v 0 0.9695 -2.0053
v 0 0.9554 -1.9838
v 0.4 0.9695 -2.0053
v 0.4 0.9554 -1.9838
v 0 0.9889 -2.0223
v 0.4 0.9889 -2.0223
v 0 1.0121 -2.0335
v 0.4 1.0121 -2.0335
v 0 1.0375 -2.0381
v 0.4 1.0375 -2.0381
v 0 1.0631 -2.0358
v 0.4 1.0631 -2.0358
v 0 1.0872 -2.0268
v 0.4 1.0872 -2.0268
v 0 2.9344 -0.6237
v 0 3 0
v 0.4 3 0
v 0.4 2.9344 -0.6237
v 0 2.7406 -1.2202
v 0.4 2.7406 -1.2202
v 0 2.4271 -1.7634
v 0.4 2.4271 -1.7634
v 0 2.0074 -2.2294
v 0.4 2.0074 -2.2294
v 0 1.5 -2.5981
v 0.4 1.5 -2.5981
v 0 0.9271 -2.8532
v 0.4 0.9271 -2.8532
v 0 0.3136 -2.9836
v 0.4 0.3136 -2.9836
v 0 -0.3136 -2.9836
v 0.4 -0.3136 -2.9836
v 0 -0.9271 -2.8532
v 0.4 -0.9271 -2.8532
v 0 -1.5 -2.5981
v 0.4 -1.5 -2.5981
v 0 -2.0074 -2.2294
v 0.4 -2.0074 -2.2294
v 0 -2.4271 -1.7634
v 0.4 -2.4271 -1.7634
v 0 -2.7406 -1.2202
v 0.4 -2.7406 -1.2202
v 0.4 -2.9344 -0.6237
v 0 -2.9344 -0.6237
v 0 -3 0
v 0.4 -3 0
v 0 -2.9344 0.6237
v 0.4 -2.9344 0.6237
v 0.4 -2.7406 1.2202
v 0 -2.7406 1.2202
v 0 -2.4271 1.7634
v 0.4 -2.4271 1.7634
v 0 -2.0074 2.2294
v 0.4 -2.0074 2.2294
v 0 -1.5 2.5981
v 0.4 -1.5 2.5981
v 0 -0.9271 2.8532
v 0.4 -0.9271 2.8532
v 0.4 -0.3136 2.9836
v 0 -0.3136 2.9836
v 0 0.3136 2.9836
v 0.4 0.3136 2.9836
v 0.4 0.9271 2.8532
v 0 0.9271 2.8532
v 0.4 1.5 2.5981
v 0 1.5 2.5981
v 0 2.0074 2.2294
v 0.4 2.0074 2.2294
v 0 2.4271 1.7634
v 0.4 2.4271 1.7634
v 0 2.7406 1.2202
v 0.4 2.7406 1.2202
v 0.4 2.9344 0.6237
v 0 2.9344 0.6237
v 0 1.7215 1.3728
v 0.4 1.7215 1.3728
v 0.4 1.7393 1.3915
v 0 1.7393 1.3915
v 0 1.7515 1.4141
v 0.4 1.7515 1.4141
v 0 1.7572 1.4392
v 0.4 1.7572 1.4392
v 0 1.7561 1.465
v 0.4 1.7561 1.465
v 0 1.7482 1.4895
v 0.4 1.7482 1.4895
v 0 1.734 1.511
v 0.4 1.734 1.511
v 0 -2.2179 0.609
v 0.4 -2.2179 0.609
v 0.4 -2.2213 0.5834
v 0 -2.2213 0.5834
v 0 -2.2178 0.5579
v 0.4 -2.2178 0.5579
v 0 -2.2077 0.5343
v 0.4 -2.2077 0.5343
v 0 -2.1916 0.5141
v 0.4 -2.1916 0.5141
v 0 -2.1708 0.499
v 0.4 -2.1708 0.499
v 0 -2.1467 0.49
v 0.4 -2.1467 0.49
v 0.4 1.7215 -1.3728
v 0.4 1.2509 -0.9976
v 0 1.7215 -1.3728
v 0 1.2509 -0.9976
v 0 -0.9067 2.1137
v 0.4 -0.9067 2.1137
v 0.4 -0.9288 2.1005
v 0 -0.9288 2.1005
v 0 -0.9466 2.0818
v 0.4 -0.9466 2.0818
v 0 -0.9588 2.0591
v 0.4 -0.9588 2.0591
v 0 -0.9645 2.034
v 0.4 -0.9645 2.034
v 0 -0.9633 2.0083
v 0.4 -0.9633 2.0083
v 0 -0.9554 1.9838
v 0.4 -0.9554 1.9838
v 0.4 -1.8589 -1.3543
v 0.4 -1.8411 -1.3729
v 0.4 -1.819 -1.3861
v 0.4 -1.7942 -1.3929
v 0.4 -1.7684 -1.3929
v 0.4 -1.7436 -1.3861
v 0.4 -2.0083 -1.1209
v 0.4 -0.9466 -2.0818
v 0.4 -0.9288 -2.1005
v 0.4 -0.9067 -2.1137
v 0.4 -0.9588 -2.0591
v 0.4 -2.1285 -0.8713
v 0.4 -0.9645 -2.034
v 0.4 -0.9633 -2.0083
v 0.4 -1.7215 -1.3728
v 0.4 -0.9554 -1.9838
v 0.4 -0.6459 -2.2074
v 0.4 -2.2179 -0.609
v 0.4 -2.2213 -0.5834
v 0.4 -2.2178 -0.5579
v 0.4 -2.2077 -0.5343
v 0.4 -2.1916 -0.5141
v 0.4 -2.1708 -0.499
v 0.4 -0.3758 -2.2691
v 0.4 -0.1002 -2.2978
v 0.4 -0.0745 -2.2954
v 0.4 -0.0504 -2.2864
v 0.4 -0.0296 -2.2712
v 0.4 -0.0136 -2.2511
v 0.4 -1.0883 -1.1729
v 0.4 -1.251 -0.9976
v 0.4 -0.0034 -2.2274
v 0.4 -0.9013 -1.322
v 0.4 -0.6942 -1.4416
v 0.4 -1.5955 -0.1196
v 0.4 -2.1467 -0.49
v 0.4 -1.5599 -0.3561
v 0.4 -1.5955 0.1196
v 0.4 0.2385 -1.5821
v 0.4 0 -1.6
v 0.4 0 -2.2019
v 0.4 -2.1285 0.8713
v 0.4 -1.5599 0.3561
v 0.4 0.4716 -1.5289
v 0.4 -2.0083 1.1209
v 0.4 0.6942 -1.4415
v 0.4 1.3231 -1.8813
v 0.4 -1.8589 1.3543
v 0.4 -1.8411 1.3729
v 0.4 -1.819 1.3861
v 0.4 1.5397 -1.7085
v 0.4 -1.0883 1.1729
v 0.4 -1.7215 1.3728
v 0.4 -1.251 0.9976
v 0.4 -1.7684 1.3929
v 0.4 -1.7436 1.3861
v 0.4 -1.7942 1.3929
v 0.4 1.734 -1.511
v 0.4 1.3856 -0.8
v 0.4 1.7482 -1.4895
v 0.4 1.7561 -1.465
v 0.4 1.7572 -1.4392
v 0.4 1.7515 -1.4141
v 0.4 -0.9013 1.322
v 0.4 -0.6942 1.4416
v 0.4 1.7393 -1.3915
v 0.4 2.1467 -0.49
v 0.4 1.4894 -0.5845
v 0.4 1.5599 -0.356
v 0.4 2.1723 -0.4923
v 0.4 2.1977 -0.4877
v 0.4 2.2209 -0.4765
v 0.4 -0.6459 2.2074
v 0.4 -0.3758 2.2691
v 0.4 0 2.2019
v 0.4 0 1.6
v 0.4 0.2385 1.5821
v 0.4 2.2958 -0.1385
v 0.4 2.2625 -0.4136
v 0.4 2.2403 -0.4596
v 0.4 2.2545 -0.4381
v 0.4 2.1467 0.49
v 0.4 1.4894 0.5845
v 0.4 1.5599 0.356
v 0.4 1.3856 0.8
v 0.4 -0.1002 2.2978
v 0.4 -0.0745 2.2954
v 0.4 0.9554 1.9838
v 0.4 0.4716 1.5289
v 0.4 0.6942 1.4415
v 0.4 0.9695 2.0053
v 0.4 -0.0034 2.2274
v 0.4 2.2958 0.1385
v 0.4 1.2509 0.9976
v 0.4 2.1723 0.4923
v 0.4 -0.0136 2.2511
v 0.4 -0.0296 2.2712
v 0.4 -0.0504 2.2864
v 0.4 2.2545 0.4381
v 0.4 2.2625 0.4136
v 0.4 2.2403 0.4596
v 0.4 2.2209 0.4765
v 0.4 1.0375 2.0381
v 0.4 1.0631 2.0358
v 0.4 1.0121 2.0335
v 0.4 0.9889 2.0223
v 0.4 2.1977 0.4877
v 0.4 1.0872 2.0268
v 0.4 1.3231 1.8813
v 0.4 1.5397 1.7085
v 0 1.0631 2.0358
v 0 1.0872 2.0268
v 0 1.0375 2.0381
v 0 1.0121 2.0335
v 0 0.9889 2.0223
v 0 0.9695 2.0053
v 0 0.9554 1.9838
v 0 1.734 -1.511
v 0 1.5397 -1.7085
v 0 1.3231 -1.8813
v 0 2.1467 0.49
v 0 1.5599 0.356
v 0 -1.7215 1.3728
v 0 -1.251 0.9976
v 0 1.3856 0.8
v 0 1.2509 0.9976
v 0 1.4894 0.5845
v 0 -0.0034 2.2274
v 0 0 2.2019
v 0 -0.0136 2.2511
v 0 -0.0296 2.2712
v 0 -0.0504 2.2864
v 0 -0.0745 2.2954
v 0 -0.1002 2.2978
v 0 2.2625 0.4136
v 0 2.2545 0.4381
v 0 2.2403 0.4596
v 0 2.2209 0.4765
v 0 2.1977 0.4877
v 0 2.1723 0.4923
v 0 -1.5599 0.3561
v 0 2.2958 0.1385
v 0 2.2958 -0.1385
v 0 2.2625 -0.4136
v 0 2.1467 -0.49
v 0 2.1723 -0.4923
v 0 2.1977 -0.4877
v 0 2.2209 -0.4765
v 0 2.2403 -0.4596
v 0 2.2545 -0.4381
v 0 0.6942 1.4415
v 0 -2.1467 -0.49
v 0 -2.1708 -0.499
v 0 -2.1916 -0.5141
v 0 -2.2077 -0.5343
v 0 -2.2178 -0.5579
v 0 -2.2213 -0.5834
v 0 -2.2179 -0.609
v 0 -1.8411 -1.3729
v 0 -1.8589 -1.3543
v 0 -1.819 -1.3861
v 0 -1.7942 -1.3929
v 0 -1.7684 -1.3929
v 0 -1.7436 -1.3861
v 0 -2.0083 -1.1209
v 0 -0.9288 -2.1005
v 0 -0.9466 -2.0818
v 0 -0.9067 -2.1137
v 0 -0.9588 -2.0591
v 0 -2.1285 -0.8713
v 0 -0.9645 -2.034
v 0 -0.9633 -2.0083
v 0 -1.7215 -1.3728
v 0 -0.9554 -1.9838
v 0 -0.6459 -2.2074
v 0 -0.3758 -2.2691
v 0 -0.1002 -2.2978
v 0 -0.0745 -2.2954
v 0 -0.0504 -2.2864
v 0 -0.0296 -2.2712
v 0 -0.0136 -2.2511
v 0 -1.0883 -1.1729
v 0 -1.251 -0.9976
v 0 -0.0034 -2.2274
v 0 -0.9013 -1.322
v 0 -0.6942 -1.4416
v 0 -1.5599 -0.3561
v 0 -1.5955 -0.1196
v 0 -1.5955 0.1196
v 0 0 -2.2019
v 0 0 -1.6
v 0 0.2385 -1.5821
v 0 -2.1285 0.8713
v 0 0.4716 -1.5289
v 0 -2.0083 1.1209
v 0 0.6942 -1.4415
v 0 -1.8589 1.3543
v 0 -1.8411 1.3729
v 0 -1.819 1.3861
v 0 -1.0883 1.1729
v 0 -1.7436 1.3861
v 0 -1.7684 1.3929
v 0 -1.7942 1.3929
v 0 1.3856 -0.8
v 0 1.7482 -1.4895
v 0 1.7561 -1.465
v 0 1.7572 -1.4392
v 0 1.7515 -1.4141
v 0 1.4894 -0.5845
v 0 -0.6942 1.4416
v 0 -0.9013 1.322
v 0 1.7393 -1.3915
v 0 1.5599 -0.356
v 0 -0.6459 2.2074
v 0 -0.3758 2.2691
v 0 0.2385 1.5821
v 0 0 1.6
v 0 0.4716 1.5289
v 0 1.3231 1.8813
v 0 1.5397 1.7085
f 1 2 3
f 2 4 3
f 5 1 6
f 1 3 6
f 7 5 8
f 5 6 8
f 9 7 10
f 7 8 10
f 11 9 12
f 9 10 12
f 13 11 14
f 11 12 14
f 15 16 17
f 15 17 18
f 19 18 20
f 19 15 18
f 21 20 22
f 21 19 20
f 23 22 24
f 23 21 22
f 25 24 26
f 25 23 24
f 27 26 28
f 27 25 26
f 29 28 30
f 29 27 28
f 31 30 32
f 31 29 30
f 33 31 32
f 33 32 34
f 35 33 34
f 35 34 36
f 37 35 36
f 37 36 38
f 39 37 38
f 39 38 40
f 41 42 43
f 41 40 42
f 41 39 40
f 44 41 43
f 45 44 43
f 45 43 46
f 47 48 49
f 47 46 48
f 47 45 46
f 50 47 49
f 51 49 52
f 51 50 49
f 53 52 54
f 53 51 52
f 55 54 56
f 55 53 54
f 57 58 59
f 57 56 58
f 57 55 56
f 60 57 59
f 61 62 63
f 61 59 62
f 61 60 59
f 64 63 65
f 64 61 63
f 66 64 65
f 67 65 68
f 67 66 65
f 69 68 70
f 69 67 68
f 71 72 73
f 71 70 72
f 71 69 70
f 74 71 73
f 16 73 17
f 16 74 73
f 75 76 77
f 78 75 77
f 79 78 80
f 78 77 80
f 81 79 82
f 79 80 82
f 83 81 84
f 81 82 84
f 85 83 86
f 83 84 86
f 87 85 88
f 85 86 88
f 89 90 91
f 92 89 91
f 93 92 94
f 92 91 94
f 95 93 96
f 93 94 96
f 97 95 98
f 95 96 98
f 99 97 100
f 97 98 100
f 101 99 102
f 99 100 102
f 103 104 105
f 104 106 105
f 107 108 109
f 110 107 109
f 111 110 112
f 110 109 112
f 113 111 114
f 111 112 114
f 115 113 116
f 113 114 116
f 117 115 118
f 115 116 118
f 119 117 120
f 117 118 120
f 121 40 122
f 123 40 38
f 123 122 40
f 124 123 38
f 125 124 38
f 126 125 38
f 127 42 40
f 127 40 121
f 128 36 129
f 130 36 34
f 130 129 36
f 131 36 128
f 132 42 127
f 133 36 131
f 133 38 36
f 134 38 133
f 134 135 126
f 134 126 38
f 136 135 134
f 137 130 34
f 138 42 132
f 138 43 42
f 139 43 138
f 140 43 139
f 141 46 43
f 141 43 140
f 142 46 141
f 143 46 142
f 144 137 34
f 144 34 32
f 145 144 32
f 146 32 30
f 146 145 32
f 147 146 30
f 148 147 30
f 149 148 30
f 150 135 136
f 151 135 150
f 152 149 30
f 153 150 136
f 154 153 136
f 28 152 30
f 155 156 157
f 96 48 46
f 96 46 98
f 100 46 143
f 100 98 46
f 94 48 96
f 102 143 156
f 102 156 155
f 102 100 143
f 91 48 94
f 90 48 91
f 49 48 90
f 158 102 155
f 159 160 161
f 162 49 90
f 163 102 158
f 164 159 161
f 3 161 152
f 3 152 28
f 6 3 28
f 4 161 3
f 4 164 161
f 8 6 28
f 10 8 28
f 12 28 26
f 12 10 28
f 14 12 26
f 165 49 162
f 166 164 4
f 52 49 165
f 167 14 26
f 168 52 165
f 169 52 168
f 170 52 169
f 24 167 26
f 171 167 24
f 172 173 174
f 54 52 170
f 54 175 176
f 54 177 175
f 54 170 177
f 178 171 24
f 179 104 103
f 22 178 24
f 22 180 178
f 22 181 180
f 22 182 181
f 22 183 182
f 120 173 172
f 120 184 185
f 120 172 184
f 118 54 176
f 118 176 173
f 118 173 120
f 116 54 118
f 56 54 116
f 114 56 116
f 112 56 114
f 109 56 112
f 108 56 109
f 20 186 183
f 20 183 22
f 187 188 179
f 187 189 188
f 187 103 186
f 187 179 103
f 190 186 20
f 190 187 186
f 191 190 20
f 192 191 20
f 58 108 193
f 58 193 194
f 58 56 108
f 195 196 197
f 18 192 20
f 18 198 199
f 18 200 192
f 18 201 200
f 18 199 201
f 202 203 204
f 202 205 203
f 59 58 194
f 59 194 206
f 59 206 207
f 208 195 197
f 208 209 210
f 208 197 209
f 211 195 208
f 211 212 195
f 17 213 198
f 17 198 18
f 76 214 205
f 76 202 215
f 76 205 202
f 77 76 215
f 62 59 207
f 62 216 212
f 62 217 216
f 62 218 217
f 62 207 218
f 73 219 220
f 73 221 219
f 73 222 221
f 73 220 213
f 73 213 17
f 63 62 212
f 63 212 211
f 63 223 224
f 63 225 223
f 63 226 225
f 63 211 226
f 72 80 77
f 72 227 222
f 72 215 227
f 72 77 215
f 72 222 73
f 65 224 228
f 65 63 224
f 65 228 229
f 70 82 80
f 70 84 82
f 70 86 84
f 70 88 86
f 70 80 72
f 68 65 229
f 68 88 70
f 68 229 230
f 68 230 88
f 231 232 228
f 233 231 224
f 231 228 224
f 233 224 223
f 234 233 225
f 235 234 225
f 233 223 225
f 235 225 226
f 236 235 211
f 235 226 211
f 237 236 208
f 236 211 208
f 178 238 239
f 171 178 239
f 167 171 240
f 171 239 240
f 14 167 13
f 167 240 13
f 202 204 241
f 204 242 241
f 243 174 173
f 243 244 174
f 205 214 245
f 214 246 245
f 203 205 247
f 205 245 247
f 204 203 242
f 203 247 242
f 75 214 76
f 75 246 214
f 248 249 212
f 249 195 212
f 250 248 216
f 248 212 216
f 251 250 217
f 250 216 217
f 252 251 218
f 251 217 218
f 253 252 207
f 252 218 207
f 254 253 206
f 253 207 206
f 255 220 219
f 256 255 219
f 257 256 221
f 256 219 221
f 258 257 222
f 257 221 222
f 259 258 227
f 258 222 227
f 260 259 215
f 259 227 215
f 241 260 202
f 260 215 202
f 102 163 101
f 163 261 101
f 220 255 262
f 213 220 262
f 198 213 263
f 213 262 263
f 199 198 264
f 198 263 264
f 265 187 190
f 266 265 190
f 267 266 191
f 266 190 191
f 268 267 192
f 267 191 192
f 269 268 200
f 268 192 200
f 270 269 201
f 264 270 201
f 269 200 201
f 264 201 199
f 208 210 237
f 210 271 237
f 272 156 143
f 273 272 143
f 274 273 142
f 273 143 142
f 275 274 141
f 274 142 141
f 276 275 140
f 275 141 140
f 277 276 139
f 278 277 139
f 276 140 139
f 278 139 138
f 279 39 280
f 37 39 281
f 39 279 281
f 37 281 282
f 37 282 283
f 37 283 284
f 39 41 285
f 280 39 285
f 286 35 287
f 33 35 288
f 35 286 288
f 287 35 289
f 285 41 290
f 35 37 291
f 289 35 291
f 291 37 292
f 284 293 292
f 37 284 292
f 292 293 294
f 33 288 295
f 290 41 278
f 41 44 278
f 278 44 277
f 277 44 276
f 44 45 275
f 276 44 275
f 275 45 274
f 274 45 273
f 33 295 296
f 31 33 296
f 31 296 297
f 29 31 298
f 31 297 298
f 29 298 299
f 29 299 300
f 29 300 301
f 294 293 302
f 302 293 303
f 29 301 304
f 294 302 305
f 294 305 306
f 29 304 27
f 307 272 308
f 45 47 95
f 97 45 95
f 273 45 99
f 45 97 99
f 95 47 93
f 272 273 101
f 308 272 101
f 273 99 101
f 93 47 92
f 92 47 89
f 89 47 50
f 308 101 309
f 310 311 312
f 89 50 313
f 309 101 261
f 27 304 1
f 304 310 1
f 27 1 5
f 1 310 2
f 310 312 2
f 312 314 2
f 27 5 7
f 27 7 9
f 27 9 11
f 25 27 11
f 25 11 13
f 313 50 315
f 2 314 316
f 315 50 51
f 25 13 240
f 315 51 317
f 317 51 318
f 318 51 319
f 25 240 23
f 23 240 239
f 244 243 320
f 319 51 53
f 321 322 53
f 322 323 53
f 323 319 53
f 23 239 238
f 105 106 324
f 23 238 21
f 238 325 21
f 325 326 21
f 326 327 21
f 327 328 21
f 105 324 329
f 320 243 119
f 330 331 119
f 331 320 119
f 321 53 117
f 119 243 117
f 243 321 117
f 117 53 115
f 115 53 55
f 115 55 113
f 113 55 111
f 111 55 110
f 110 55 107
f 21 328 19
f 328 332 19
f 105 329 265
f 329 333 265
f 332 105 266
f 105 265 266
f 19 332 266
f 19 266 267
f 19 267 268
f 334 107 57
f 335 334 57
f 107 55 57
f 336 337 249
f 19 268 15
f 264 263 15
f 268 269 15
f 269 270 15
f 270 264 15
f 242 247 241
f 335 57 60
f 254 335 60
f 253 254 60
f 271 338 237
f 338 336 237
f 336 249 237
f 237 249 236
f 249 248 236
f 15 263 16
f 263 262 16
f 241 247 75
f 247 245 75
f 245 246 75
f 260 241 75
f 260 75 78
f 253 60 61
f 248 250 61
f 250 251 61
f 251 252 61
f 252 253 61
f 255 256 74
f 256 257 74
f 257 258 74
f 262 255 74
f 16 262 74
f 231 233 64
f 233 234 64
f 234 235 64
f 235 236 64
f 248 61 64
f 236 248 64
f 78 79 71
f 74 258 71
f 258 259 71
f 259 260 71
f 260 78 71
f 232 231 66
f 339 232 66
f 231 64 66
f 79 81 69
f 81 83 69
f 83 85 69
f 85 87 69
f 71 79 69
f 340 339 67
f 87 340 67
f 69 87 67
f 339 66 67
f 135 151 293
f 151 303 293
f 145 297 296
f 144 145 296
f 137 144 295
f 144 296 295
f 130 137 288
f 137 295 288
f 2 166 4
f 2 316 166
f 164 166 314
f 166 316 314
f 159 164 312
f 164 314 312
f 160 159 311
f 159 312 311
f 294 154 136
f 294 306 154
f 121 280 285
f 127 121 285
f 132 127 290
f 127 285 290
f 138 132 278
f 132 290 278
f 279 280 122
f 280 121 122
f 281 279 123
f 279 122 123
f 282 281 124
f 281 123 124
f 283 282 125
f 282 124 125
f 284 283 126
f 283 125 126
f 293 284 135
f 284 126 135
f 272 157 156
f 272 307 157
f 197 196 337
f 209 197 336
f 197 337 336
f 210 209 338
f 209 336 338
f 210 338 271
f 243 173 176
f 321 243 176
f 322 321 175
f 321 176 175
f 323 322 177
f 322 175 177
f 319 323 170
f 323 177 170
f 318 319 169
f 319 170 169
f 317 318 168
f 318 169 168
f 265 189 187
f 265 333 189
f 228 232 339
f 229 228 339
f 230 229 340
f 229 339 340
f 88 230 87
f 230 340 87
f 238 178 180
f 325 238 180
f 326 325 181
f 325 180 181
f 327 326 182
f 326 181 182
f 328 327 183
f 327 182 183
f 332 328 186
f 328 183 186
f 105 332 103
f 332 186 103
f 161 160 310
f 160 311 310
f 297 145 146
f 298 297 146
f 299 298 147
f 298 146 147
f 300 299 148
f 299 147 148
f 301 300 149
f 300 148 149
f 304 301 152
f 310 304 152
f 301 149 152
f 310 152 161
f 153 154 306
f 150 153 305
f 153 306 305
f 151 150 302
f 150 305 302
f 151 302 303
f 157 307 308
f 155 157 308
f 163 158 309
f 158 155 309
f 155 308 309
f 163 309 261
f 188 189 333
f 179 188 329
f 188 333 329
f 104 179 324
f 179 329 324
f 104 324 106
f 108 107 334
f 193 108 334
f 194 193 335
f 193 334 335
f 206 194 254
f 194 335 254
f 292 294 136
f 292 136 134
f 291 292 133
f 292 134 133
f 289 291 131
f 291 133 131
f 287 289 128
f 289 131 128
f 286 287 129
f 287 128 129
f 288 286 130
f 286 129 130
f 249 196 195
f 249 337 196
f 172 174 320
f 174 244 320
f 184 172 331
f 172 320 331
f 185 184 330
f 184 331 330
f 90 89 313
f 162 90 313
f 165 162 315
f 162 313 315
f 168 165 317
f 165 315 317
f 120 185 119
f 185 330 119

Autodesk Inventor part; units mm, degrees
ref_plane "YZ Plane" through (0, 0, 0) normal (1, 0, 0) x (0, 1, 0)
ref_plane "XZ Plane" through (0, 0, 0) normal (0, 1, 0) x (-1, 0, 0)
sketch "Sketch1" plane through (0, 0, 0) normal (1, 0, 0) x (0, 1, 0)
  circle A0 centre (0, 0) radius 3
  circle A1 centre (0, 0) radius 1.6
  dimension "d0" = 3.2
  dimension "d1" = 6
extrude "Body" add sketch "Sketch1" along normal blind 0.4
sketch "Sketch2" plane through (0, 0, 0) normal (-1, 0, 0) x (0, 0, 1)
  circle A0 centre (0, 0) radius 1.6 projected
  arc A1 (0.5118, 2.2423) -> (-0.5118, 2.2423) centre (0, 0) ccw
  line L0 (-0.356, 1.5599) -> (-0.5118, 2.2423)
  line L1 (-0.356, 1.5599) -> (0, 0) construction
  line L2 (0, 2.3) -> (0, 0) construction
  line L3 (0.356, 1.5599) -> (0.5118, 2.2423)
  line L4 (0.356, 1.5599) -> (0, 0) construction
  dimension "d6" = 4.6
  dimension "d7" = 12.857
extrude "Cut" cut sketch "Sketch2" along normal through all both and the other way through all contours A0 L0 A1 L3
fillet "Fillet1" radius 0.096 2 edges at (0.2, 2.2423, 0.5118) (0.2, 2.2423, -0.5118)
pattern_circular "Cuts" count 7 over 360 about axis through (-10, 0, 0) along (1, 0, 0) of "Cut", "Fillet1"
ref_plane "Work Plane1" through (0, 0, 0) normal (0, 1, 0) x (1, 0, 0)
equation "\"d0\" = SD1"
equation "\"d1\" = SD2"
equation "\"d2\" = SD"
equation "\"d6\" = 0.5 * SD2 + 0.5 * SD1"
equation "\"d8\" = SD"
equation "\"d10\" = 0.03 * SD1"
equation "\"SD1\" = 3.2"
equation "\"SD2\" = 6"
equation "\"SD\" = 0.4"
equation "\"NND\" = 3"
properties part number "DIN 6798 - J 3.2" material "Steel, Mild"
